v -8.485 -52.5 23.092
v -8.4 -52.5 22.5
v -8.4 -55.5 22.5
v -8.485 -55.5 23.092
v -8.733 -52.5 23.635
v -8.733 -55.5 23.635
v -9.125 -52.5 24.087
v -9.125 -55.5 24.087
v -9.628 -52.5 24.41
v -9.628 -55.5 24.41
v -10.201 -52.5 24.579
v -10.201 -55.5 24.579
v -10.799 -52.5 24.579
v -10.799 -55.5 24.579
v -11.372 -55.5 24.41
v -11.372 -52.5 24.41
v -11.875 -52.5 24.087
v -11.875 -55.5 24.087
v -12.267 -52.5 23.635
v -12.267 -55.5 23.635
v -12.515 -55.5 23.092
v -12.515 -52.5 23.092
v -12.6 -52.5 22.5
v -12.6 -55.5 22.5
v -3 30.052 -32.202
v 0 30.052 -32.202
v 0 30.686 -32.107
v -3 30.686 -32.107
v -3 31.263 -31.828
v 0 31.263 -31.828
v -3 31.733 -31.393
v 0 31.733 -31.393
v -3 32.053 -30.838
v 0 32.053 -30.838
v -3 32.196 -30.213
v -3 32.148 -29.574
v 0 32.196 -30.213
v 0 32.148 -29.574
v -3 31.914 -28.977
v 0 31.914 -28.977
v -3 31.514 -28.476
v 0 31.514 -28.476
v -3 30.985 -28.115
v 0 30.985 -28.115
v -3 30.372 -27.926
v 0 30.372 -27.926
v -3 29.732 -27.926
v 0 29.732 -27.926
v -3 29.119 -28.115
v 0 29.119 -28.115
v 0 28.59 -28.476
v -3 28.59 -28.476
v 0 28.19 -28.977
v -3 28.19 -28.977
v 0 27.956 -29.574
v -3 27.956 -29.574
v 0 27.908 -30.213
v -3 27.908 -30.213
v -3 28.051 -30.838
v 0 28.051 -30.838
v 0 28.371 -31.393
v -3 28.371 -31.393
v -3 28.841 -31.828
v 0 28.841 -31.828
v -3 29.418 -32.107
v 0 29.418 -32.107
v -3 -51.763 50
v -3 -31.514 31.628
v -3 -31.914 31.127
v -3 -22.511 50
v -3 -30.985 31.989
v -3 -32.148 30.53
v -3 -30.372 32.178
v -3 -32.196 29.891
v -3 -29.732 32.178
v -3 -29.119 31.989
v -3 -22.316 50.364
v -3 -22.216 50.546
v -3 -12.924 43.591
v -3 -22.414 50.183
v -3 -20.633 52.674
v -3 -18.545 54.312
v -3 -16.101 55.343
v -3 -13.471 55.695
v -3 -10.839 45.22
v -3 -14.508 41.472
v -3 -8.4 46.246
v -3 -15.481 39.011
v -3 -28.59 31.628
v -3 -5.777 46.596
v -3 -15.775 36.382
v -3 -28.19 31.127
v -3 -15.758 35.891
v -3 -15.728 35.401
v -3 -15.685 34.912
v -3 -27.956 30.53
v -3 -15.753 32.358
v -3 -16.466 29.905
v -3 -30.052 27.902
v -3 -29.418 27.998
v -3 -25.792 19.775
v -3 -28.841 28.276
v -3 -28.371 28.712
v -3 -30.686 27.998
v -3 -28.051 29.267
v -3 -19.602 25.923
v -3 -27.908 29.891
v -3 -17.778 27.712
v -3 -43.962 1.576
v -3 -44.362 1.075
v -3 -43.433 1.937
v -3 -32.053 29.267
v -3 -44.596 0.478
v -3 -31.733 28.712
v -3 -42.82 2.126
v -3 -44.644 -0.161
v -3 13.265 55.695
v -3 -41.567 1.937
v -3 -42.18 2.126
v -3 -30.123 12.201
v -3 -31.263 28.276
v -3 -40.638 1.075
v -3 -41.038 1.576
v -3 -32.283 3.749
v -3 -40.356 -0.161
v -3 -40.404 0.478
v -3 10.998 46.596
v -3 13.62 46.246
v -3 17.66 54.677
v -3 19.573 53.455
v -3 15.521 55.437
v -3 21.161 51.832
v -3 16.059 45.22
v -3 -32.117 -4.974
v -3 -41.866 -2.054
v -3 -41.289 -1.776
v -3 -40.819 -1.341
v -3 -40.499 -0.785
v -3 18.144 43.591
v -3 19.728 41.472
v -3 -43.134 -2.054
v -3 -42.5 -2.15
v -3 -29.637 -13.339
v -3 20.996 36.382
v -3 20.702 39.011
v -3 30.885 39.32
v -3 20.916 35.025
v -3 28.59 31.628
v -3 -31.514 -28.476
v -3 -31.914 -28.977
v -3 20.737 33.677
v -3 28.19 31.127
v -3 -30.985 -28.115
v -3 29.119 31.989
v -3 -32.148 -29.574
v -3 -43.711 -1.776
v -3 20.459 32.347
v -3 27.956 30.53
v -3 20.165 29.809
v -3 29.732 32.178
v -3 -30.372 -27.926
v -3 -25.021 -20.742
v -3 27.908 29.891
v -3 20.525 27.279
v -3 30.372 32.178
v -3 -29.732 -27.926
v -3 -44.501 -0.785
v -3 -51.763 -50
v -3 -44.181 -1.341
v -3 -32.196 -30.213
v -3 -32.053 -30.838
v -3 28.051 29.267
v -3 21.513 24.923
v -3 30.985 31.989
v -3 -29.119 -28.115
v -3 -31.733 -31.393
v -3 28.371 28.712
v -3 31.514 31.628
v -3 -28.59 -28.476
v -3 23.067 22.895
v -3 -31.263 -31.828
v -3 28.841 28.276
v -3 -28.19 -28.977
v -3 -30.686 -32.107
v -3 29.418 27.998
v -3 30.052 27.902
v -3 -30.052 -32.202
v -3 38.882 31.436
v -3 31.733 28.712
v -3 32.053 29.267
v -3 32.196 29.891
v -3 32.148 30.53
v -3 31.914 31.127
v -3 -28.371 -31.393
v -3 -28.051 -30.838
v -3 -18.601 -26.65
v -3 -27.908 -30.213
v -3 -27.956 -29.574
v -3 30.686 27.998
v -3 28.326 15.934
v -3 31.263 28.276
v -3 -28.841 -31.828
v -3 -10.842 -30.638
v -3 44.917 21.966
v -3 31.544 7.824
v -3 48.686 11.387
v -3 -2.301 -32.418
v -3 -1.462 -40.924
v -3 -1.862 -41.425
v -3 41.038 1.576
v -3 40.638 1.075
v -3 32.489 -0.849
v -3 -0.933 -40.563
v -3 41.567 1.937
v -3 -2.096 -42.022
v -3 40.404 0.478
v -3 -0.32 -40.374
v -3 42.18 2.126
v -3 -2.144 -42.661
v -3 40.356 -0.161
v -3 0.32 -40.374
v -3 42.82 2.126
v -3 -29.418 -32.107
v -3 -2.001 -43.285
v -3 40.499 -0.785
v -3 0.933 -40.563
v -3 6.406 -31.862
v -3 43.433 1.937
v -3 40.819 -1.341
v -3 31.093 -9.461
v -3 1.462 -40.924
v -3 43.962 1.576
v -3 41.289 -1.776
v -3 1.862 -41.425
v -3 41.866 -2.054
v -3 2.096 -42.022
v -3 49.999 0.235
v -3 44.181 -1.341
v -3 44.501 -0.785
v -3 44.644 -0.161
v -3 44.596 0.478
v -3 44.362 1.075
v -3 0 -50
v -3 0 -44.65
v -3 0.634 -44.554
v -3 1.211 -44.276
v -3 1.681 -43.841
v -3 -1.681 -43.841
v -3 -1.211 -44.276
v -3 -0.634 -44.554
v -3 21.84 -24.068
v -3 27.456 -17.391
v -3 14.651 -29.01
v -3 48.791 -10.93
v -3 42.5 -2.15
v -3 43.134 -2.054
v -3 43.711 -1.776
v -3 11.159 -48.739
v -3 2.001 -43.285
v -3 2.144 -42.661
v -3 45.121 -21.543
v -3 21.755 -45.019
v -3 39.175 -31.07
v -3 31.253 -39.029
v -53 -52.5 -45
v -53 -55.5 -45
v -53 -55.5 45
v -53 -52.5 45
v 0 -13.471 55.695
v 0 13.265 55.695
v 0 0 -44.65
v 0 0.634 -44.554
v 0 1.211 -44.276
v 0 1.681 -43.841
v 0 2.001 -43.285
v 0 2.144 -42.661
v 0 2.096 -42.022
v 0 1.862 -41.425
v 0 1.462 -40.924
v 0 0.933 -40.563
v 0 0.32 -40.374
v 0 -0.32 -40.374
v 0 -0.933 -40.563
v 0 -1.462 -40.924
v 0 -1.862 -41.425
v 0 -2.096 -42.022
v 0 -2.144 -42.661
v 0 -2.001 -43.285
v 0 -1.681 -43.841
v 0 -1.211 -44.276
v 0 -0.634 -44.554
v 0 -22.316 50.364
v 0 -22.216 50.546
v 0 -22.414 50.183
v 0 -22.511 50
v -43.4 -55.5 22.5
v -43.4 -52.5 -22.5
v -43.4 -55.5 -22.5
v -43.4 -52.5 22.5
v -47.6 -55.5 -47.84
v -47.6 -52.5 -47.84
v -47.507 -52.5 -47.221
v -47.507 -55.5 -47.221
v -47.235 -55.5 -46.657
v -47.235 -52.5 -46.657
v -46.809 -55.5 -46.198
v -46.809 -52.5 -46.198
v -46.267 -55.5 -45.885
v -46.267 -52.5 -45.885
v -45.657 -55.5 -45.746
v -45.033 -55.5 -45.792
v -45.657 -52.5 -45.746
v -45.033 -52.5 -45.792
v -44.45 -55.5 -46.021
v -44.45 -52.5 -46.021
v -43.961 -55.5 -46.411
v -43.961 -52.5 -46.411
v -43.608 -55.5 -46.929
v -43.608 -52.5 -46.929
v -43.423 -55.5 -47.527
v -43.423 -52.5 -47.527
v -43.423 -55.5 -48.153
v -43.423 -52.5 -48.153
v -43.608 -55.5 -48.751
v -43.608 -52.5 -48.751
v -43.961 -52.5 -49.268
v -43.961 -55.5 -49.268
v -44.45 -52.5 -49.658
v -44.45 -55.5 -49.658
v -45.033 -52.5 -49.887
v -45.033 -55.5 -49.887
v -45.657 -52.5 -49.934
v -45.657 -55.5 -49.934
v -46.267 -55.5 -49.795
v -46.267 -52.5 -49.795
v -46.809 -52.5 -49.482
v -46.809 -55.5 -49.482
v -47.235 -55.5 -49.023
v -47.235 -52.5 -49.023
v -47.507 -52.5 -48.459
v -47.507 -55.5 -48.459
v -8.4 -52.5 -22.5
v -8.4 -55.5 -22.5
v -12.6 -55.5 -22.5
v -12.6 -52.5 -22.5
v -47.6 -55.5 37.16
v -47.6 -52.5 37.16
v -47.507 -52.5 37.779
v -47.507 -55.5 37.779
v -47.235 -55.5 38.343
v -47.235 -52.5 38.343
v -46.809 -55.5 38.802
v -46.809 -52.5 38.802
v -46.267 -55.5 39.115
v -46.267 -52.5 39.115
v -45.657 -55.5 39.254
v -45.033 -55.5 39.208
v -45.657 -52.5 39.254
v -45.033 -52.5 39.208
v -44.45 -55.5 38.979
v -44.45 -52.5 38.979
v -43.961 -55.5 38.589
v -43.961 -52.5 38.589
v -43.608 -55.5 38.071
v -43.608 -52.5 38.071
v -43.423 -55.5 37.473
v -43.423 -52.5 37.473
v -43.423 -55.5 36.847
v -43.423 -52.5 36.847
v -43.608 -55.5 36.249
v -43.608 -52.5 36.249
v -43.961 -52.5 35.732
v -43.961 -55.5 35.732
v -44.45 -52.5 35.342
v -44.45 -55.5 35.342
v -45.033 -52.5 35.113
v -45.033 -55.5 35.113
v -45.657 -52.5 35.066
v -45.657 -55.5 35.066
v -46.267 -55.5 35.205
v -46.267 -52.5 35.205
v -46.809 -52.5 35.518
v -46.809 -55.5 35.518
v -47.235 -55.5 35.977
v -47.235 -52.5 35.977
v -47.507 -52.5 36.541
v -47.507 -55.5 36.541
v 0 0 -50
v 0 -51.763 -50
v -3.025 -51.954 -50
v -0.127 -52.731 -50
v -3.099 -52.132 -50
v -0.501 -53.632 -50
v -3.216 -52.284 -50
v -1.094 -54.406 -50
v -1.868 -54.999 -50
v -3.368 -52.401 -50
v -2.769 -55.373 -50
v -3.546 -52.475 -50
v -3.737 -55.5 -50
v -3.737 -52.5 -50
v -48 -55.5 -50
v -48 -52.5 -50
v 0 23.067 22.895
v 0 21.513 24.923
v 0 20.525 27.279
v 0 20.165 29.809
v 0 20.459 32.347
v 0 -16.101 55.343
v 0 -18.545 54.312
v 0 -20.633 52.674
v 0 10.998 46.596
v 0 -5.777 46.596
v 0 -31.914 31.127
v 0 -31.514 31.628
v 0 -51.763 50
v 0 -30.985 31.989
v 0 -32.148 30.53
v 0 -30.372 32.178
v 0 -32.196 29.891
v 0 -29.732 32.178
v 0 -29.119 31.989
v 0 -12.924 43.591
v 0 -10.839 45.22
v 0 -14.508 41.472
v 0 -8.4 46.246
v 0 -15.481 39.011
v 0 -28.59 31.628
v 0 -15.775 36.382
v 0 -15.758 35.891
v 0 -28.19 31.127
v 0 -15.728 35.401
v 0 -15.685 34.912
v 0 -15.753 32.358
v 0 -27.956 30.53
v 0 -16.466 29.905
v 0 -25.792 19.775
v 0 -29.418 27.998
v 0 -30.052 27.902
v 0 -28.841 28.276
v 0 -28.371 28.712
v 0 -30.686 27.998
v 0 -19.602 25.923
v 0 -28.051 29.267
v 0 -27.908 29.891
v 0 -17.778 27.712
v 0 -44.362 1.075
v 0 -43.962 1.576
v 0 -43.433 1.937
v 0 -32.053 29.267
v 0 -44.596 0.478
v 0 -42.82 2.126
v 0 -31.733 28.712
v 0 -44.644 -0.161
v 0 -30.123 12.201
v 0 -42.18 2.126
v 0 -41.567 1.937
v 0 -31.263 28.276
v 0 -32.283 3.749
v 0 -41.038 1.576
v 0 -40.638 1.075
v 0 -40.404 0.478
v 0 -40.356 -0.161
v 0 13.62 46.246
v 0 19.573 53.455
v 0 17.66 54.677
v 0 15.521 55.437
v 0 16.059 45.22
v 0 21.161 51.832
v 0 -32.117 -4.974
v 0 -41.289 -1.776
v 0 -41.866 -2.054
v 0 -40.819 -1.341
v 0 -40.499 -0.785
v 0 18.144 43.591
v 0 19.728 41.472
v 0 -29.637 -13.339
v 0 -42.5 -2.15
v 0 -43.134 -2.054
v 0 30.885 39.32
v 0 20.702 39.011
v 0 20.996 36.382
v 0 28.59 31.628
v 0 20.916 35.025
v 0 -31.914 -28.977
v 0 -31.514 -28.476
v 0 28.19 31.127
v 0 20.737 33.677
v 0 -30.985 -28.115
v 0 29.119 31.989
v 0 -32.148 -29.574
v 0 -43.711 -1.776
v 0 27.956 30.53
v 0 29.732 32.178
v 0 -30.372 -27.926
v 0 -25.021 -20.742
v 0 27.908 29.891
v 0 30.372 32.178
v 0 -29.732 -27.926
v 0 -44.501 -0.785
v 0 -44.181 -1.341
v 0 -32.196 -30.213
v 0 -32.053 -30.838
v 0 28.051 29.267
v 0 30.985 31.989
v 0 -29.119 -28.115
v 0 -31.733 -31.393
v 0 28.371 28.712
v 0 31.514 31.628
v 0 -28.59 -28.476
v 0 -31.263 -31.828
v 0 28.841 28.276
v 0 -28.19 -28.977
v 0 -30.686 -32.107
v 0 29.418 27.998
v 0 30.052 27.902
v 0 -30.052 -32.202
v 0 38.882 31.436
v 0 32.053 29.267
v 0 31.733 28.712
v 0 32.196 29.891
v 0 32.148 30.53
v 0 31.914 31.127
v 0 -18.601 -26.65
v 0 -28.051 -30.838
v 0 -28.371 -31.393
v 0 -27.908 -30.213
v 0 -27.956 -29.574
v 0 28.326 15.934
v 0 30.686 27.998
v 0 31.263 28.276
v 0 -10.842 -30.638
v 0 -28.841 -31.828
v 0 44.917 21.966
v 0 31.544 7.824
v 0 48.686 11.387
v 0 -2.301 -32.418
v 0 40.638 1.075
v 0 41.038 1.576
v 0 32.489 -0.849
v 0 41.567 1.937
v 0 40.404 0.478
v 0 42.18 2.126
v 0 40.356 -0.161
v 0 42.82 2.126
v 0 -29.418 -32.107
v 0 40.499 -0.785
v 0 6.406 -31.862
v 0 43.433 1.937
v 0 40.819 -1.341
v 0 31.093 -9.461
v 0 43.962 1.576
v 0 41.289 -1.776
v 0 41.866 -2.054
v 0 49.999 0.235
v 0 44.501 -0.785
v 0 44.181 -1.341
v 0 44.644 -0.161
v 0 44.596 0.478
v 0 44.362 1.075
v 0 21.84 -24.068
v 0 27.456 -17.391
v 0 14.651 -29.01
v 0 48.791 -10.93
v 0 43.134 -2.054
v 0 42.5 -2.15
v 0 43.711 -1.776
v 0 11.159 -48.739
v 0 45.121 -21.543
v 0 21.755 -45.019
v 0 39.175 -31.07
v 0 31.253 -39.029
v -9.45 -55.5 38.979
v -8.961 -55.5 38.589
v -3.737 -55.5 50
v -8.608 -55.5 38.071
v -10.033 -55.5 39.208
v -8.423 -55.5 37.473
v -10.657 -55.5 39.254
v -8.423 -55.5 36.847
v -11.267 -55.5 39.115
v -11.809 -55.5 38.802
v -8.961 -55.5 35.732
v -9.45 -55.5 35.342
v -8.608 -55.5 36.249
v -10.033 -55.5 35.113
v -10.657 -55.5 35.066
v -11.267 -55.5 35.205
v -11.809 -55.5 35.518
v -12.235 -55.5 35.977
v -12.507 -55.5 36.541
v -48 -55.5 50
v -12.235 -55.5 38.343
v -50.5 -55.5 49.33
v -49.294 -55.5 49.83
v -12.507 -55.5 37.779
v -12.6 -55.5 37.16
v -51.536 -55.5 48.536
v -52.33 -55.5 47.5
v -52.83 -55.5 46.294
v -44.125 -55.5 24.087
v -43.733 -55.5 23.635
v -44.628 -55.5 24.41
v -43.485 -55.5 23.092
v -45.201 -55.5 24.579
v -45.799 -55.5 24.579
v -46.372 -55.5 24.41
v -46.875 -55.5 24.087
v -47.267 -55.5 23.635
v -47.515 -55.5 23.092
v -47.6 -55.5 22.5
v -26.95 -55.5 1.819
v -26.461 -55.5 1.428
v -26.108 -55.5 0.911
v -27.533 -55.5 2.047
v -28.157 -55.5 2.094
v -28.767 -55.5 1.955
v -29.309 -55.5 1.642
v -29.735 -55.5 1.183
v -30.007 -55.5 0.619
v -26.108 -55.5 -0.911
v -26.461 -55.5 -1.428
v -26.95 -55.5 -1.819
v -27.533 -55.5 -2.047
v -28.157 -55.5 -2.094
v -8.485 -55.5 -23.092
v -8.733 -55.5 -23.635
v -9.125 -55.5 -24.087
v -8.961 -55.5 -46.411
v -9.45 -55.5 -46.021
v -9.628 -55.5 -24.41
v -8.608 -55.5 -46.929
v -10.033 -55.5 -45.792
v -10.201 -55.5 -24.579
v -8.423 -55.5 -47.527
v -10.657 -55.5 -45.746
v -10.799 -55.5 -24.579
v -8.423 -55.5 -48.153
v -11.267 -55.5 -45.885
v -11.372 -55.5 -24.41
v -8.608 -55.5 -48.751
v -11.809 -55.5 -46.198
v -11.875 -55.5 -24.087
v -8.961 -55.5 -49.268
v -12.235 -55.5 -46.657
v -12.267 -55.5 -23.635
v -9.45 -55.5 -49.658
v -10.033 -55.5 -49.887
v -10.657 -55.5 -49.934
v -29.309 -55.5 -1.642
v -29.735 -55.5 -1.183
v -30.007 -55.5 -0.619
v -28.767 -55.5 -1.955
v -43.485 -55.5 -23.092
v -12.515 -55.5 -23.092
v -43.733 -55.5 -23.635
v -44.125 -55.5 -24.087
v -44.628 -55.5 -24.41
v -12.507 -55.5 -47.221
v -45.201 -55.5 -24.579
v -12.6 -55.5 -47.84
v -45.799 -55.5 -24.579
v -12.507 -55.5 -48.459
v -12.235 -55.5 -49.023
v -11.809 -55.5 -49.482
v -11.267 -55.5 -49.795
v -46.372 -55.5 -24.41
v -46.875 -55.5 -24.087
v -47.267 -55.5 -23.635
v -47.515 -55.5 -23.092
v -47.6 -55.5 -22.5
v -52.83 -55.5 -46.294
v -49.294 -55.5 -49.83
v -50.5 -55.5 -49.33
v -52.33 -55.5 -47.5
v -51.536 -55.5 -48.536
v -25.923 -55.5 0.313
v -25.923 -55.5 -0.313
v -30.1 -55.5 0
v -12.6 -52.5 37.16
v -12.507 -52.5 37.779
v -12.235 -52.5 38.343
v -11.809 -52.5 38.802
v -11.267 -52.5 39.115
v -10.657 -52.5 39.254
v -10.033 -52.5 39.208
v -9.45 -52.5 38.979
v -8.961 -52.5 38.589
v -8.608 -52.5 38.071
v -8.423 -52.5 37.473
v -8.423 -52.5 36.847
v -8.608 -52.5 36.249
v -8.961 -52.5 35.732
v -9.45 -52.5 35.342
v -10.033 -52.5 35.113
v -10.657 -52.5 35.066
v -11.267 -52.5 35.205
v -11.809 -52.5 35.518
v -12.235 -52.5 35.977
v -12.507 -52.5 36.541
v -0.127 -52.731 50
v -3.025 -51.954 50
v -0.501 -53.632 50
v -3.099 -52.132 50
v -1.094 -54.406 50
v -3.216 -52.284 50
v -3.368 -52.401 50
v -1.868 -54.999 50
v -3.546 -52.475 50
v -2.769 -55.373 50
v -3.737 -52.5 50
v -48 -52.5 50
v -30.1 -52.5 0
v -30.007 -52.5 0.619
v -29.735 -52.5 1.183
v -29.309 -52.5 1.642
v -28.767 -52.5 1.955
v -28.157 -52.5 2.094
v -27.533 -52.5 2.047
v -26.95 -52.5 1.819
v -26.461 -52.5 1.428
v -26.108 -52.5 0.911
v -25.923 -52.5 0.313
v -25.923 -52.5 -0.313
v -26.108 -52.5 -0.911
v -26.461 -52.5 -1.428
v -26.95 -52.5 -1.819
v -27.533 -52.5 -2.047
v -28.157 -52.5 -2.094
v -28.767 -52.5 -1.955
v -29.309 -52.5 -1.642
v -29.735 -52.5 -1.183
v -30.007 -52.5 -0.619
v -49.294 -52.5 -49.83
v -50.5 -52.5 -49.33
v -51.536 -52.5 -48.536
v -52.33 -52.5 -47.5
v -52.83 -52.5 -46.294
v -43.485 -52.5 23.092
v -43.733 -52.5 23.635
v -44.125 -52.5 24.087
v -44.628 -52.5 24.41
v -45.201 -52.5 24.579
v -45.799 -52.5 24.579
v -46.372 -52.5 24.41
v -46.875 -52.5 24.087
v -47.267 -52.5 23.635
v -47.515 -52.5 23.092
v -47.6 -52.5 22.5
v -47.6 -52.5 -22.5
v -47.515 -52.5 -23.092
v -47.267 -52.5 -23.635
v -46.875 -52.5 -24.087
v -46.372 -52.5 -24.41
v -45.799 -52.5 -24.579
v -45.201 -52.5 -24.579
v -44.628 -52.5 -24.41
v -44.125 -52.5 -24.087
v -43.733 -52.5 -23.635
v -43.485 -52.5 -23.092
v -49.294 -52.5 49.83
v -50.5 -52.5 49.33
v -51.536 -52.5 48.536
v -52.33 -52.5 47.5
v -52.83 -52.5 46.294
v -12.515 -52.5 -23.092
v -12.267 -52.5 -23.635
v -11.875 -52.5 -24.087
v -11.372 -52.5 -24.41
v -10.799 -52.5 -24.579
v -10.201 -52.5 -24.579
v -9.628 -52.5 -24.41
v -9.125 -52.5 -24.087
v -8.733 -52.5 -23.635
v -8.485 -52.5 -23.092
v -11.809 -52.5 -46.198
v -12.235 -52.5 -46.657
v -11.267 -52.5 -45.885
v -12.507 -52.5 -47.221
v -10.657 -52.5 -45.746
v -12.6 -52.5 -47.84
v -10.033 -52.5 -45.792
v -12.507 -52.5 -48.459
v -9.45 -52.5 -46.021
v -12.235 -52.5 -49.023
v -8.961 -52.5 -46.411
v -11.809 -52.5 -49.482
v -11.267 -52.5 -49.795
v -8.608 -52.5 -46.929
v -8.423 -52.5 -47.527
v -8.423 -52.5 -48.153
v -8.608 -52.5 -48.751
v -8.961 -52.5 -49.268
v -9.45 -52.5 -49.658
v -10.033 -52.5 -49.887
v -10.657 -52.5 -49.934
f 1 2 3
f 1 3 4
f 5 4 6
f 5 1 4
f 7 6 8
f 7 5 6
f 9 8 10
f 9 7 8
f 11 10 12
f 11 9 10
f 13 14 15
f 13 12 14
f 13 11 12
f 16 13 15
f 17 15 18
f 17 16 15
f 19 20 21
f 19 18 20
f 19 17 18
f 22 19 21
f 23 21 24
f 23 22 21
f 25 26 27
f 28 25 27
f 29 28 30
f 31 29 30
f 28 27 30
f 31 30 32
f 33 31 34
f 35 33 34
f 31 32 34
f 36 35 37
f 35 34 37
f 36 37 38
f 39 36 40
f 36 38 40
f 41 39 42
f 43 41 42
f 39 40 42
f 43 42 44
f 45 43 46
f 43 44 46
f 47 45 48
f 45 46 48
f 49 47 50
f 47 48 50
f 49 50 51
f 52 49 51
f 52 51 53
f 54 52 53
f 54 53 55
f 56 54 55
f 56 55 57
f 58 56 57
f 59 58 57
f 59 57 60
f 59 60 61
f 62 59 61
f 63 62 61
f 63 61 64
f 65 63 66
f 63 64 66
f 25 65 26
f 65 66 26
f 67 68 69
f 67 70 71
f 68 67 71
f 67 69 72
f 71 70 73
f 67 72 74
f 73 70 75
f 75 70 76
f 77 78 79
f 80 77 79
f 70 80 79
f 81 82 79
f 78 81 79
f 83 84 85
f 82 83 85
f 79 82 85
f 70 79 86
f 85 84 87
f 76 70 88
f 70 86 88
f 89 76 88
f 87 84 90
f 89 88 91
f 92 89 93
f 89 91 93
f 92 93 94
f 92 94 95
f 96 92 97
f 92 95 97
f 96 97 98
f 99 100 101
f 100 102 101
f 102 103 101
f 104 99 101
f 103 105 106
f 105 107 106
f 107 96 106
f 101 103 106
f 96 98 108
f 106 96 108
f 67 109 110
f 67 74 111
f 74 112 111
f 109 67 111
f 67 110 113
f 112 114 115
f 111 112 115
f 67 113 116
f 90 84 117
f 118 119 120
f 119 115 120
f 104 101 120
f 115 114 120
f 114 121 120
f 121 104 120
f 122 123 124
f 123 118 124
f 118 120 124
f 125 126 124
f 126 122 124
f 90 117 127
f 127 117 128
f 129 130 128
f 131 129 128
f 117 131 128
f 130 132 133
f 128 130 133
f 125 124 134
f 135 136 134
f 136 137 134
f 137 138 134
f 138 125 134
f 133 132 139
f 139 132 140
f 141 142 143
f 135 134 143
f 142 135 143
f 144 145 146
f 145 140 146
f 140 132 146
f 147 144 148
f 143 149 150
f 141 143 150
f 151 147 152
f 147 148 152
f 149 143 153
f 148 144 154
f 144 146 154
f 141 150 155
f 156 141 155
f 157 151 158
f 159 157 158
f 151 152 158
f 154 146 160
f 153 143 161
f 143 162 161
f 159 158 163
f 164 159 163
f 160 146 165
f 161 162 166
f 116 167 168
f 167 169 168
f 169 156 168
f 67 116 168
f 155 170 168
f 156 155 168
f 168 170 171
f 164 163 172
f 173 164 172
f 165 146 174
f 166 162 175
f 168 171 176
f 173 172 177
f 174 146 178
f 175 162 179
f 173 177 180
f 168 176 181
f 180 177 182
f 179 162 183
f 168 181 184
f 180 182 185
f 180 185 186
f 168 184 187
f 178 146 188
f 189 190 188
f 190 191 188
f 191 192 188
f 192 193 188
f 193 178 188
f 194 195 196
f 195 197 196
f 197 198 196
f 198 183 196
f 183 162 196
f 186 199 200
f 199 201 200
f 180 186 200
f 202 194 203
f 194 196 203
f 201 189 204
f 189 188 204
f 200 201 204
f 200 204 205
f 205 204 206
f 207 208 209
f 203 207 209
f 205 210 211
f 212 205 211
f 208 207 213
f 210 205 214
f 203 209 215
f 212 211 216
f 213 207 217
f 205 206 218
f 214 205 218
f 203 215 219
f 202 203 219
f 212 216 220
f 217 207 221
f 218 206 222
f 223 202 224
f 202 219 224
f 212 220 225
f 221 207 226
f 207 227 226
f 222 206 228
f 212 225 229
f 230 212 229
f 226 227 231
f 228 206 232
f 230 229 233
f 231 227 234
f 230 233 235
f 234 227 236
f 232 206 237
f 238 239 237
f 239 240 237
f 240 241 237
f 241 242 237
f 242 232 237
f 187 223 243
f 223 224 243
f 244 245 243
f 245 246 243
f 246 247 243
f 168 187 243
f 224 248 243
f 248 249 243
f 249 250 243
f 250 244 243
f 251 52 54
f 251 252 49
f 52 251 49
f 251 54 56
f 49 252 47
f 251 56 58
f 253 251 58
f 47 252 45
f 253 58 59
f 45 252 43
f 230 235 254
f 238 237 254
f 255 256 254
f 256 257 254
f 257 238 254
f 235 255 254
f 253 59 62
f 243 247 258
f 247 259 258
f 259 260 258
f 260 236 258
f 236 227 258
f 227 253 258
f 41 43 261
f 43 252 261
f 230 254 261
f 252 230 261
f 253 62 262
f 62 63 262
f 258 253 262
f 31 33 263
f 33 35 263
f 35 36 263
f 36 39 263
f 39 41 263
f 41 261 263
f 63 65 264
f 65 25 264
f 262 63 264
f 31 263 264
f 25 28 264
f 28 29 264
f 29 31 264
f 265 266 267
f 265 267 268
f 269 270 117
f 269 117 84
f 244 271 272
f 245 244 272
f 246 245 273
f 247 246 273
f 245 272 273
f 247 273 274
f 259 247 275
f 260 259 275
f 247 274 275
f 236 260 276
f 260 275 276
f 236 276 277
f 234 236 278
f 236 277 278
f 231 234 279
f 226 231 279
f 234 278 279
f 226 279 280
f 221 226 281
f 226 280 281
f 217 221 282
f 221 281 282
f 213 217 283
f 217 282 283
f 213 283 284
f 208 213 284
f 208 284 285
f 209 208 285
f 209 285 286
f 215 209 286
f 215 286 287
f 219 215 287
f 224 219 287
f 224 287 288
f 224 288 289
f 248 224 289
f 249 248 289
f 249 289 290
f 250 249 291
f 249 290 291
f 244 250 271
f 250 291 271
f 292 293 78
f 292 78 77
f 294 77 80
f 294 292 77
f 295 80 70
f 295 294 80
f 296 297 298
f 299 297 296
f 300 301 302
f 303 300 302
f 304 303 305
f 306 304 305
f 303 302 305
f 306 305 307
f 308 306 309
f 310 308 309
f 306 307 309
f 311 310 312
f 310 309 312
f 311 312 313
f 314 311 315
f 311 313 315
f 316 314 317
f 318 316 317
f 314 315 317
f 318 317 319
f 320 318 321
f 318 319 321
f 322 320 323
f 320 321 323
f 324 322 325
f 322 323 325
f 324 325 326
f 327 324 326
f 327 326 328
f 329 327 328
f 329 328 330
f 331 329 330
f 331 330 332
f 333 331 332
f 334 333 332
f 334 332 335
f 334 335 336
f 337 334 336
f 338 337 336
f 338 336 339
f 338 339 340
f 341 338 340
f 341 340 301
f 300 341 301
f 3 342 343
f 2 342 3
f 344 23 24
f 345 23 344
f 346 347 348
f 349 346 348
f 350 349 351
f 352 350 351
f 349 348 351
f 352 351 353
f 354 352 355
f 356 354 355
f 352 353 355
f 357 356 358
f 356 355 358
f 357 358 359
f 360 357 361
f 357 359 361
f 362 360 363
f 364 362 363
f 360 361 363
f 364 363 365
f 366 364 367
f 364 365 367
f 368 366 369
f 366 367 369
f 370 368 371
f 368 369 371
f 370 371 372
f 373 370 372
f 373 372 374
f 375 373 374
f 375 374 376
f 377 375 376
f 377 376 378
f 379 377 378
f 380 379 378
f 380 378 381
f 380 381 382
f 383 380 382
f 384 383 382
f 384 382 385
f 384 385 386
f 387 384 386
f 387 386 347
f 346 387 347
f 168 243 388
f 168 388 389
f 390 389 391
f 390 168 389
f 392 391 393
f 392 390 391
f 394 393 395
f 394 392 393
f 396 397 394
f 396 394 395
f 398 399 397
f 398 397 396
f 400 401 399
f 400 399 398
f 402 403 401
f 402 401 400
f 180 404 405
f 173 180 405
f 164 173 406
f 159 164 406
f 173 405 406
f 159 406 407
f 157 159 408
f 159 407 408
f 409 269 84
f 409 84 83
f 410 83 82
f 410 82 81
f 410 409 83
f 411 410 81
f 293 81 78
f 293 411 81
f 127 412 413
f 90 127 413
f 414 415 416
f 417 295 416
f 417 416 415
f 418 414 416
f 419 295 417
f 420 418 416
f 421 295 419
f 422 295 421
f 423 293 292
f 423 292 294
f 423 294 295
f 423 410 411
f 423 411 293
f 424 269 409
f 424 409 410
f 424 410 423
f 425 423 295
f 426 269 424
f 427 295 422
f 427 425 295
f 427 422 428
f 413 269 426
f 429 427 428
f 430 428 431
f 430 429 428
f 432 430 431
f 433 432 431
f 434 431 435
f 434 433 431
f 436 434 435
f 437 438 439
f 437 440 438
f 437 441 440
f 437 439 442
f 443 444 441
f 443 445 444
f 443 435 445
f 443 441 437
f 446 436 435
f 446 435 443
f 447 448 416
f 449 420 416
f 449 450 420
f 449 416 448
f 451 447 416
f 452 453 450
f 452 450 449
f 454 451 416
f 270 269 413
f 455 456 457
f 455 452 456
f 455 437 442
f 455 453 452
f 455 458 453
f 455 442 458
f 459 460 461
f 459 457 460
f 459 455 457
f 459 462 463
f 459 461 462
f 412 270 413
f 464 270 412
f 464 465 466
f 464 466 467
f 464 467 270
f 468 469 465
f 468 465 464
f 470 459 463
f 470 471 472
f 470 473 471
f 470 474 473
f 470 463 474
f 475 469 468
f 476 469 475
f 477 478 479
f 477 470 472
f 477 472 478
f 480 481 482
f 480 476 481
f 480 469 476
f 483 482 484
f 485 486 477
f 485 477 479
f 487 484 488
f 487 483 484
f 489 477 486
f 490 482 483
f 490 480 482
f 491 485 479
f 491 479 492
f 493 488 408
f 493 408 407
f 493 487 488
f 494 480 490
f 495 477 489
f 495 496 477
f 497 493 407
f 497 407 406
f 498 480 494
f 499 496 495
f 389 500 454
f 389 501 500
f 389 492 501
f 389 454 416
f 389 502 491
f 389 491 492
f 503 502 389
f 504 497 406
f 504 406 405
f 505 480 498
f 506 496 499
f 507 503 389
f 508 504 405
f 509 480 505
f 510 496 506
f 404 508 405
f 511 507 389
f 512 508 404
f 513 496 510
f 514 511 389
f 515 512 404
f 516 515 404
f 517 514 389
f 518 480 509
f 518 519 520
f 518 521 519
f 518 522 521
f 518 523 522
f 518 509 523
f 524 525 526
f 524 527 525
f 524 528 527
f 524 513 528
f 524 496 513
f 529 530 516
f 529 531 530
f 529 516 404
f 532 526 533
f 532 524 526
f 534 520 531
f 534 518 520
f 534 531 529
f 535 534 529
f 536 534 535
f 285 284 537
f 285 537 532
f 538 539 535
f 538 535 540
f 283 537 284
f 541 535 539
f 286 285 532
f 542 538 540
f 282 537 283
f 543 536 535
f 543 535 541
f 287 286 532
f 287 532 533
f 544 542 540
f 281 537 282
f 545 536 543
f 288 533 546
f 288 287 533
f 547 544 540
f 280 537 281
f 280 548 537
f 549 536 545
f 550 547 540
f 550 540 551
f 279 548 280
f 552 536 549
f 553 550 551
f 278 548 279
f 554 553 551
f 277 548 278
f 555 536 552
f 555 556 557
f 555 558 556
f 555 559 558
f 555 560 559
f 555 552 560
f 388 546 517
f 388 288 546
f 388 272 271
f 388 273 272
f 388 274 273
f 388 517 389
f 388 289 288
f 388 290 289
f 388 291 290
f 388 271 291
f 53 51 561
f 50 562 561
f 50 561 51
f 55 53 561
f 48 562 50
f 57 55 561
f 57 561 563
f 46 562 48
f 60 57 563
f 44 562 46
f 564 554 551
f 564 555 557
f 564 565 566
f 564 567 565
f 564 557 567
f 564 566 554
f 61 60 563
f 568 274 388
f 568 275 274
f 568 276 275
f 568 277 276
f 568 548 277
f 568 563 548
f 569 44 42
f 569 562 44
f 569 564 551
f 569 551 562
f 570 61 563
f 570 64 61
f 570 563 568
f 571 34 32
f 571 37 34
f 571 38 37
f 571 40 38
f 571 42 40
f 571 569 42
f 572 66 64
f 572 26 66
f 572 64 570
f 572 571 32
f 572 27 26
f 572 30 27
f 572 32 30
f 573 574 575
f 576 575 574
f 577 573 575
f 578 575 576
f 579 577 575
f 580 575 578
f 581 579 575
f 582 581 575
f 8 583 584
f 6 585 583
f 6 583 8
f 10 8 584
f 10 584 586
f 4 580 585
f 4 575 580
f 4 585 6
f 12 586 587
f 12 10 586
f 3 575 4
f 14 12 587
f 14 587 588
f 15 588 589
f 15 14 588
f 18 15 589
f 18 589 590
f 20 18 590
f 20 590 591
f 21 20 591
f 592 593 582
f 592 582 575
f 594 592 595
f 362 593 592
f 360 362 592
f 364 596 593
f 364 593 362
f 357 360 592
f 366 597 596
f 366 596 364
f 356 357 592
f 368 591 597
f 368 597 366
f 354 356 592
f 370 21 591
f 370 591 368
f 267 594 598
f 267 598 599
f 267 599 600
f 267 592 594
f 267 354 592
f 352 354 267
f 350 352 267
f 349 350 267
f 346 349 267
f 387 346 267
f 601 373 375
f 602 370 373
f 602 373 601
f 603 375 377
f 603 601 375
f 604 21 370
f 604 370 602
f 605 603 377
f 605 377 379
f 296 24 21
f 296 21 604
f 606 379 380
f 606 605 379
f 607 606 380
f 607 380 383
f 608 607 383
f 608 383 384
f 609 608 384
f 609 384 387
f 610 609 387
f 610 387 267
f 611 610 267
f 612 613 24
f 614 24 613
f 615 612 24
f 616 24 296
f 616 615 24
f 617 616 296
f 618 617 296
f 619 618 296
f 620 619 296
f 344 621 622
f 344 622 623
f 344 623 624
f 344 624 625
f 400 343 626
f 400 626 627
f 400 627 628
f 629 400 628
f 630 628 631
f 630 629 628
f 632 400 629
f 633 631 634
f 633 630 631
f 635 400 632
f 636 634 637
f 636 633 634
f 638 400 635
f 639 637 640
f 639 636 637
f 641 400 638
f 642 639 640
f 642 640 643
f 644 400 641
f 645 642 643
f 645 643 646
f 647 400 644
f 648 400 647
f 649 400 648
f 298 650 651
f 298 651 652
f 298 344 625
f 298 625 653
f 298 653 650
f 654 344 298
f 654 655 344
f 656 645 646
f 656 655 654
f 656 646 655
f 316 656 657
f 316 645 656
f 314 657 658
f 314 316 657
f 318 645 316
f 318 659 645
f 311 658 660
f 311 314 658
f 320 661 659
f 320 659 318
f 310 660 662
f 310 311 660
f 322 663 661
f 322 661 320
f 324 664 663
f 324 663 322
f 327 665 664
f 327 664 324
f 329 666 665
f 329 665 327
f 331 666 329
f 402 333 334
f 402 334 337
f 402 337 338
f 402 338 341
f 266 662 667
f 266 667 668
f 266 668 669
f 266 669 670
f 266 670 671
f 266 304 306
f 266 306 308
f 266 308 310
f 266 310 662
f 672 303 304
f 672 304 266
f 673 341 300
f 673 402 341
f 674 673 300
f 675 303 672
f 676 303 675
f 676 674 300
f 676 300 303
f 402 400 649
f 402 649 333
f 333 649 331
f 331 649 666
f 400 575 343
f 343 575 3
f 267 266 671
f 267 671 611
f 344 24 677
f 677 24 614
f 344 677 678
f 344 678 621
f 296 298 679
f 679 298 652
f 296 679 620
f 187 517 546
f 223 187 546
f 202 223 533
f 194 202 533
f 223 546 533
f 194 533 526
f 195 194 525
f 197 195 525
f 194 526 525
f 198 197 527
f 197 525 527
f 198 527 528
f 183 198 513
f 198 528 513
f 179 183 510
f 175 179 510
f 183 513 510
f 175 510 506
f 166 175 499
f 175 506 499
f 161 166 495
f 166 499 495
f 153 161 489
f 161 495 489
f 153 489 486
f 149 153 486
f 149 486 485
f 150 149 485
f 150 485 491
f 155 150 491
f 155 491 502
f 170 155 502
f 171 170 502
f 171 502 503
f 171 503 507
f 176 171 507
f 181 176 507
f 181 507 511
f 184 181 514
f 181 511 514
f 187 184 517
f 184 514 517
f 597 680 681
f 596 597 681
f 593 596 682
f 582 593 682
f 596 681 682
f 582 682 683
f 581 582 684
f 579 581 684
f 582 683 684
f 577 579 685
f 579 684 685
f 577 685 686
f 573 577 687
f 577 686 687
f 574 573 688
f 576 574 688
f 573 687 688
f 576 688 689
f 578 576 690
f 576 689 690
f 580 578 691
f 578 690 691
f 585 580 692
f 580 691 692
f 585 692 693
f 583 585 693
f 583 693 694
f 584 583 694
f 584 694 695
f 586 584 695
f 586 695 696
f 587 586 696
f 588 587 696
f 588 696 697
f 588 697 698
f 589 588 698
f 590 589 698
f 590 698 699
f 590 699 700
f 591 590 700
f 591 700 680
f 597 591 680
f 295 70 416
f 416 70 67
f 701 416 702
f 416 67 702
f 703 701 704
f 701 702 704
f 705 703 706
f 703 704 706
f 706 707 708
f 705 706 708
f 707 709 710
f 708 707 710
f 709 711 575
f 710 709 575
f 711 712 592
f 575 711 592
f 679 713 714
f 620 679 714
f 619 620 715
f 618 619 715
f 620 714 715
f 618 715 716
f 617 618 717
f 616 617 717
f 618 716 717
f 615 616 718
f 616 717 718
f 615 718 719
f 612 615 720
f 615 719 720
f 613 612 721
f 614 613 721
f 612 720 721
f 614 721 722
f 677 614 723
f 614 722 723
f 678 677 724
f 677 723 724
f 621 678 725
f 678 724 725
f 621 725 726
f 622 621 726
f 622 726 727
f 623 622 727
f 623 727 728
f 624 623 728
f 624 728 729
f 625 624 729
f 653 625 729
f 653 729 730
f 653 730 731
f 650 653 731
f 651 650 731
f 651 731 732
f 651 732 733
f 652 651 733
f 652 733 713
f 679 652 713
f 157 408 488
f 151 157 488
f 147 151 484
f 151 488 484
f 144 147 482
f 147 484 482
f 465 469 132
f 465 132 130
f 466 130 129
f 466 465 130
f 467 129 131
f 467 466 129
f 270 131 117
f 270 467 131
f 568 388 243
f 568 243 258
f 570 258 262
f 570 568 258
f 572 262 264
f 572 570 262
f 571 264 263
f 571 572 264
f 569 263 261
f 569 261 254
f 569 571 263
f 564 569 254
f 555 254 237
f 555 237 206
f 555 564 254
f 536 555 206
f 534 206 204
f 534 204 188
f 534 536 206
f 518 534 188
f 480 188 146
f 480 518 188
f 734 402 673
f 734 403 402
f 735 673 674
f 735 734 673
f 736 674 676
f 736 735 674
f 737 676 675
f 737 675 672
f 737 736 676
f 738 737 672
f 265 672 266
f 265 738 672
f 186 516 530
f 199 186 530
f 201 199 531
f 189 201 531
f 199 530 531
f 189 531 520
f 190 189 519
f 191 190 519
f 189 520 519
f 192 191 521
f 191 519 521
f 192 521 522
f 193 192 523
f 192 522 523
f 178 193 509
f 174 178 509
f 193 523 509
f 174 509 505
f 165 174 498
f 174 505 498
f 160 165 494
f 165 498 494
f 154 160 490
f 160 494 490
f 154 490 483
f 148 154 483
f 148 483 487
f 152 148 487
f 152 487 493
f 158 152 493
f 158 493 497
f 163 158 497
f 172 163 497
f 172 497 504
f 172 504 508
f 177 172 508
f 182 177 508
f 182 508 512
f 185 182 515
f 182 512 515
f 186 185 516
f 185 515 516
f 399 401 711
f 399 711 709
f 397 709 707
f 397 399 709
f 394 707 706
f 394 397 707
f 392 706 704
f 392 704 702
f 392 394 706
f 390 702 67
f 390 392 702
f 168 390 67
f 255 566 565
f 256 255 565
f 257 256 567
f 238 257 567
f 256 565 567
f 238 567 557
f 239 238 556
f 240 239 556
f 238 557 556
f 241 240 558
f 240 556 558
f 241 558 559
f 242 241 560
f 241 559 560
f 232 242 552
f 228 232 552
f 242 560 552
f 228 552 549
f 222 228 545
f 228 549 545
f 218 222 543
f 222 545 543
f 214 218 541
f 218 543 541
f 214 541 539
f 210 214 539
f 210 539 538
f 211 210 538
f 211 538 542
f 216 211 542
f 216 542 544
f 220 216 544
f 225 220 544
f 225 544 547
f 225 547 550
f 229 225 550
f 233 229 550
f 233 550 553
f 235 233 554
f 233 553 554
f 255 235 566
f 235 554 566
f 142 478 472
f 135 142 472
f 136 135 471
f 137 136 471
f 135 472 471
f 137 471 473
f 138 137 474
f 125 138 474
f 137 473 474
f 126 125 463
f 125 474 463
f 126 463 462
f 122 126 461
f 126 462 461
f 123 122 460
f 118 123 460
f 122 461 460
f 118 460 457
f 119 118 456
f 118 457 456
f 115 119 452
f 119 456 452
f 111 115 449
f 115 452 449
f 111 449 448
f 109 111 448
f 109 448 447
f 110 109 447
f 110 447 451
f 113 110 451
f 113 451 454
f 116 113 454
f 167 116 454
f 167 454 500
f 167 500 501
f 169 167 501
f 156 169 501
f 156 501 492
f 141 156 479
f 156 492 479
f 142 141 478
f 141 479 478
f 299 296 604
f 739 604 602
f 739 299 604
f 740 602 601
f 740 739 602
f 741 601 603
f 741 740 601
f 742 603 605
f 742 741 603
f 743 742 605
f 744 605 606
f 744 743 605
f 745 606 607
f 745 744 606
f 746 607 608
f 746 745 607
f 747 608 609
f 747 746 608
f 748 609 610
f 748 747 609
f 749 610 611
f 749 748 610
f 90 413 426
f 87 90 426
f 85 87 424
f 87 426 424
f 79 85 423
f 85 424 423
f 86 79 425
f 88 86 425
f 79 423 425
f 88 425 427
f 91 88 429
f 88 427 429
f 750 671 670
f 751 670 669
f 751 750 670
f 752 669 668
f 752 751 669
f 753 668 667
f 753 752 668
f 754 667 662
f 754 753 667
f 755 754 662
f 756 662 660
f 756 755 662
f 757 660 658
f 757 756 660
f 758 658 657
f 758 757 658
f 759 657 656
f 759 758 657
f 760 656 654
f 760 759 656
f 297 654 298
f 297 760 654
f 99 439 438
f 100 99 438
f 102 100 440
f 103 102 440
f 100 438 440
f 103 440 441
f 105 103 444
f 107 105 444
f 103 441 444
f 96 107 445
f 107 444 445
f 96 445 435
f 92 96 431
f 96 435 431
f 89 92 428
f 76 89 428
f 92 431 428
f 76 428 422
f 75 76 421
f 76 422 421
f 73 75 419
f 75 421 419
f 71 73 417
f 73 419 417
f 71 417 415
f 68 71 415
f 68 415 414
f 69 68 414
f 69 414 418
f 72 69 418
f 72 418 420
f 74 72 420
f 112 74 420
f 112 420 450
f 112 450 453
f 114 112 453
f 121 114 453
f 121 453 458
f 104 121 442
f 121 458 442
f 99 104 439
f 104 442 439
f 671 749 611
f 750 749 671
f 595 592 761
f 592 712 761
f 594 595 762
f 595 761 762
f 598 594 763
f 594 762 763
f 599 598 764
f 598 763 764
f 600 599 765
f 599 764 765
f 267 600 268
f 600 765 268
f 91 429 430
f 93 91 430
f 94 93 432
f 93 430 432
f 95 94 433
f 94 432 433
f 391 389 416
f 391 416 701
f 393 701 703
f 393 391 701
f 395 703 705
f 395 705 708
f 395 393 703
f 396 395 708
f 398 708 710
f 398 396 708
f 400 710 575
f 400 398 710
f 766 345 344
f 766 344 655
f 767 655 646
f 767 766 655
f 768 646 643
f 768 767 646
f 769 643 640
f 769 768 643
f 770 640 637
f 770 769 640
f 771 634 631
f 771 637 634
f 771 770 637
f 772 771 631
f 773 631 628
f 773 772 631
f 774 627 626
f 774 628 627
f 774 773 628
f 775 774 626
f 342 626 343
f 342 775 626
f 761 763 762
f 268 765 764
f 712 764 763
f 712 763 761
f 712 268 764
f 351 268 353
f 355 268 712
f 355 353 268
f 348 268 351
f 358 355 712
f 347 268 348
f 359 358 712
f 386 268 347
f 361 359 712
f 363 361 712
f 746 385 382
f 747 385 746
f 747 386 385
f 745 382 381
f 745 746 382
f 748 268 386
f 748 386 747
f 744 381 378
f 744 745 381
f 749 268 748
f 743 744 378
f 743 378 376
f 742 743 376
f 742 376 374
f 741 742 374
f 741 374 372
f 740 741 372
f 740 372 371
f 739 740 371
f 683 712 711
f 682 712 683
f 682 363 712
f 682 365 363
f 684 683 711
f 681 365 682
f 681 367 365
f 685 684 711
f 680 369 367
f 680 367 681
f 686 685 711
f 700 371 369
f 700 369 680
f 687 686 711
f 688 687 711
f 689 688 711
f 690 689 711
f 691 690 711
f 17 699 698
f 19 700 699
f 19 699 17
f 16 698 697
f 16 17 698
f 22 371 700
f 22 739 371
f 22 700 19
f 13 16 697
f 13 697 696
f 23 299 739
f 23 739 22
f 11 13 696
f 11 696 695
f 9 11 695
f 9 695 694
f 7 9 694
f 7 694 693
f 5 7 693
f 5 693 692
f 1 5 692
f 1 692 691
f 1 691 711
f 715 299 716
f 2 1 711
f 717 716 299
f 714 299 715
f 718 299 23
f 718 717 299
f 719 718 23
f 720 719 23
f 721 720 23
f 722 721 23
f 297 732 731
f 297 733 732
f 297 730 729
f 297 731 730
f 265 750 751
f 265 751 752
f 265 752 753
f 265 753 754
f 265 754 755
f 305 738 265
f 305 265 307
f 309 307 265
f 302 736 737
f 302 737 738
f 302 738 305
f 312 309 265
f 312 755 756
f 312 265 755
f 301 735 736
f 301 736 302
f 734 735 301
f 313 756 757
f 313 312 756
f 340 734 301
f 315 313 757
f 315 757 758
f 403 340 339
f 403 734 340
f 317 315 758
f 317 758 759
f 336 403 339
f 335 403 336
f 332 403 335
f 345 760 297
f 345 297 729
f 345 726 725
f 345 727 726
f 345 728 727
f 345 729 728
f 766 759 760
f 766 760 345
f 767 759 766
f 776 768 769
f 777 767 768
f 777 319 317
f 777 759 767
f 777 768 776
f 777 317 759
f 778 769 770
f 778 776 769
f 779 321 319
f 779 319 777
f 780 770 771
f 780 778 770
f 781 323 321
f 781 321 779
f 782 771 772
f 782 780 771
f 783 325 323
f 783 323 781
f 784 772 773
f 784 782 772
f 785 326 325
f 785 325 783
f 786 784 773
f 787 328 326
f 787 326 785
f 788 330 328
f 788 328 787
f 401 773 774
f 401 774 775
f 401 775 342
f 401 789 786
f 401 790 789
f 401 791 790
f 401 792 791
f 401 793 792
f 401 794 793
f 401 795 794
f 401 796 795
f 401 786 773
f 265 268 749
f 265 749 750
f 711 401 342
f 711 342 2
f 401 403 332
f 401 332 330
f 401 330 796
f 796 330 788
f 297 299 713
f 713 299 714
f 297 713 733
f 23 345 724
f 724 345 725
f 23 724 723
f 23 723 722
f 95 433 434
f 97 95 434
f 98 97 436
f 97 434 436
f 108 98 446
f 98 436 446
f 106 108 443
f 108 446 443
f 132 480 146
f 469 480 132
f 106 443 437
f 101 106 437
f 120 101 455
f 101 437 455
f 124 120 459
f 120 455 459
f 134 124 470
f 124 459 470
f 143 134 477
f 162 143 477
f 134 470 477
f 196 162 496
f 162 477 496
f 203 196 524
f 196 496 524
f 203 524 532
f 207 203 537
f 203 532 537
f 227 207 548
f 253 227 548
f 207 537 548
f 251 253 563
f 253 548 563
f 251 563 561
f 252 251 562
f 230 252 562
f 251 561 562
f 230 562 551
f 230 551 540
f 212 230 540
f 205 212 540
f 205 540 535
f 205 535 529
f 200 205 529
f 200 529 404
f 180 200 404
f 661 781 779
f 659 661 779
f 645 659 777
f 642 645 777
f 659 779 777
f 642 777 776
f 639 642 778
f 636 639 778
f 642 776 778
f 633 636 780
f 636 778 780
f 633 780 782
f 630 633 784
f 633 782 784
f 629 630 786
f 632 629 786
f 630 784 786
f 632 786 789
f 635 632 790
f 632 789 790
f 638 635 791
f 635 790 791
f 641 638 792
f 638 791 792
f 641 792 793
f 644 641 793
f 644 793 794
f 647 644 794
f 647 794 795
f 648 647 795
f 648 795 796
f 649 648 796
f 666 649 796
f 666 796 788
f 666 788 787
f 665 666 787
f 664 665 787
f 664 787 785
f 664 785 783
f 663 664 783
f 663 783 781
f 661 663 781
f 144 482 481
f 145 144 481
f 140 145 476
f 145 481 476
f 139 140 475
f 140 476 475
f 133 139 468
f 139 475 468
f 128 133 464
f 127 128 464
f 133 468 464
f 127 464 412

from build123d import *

# Parameters (mm, degrees)
SKETCH_1_R                       = 2.15
SM_BASE_FLANGE_1_DEPTH           = 3
SM_EDGE_FLANGE_1_STRIP_W         = 13.4732
SM_EDGE_FLANGE_1_STRIP_H         = 3
SM_EDGE_FLANGE_1_STRIP_CUT_DEPTH = 100
SM_EDGE_FLANGE_1_DEPTH           = 100
SKETCH_9_R                       = 2.1
CUT_EXTRUDE_1_DEPTH              = 10
FILLET_1_R                       = 5
SKETCH_10_R                      = 2.1
CUT_EXTRUDE_2_DEPTH              = 10


# Sheet-metal steps are written as plain solids
with BuildPart() as part:
    # Sketch 1 → 基体-法兰1 (new body)
    with BuildSketch(Plane(origin=(0, 0, 0), x_dir=(0, 0, -1), z_dir=(1, 0, 0))):
        with BuildLine():
            Line((-50, -22.510788707), (-50, -55.5))
            Line((-50, -55.5), (50, -55.5))
            Line((50, -55.5), (50, 0))
            ThreePointArc((50, 0), (16.339860062, 47.254724348), (-39.320358927, 30.885423324))
            Line((-39.320358927, 30.885423324), (-51.83191014, 21.160585638))
            ThreePointArc((-51.83191014, 21.160585638), (-54.677464079, 17.660055501), (-55.695008503, 13.265116159))
            Line((-55.695008503, 13.265116159), (-55.695008503, -13.471087591))
            ThreePointArc((-55.695008503, -13.471087591), (-54.312022765, -18.545244191), (-50.545595463, -22.215903549))
            ThreePointArc((-50.545595463, -22.215903549), (-50.273602999, -22.364836031), (-50, -22.510788707))
        make_face()
        with Locations((0, 42.5)):
            Circle(SKETCH_1_R, mode=Mode.SUBTRACT)
        with Locations((30.0520382, 30.0520382)):
            Circle(SKETCH_1_R, mode=Mode.SUBTRACT)
        with Locations((42.5, 0)):
            Circle(SKETCH_1_R, mode=Mode.SUBTRACT)
        with Locations((30.0520382, -30.0520382)):
            Circle(SKETCH_1_R, mode=Mode.SUBTRACT)
        with Locations((0, -42.5)):
            Circle(SKETCH_1_R, mode=Mode.SUBTRACT)
        with Locations((-30.0520382, -30.0520382)):
            Circle(SKETCH_1_R, mode=Mode.SUBTRACT)
        with Locations((-30.0520382, 30.0520382)):
            Circle(SKETCH_1_R, mode=Mode.SUBTRACT)
        with BuildLine():
            Line((-46.595603285, 10.997841176), (-46.595603285, -5.777394466))
            ThreePointArc((-46.595603285, -5.777394466), (-43.590659136, -12.923665777), (-36.381764555, -15.775107854))
            ThreePointArc((-36.381764555, -15.775107854), (-35.646197226, -15.744635296), (-34.912439019, -15.684745692))
            ThreePointArc((-34.912439019, -15.684745692), (-29.904748182, -16.465924493), (-25.923223086, -19.601951556))
            ThreePointArc((-25.923223086, -19.601951556), (32.418442092, -2.301002457), (-22.894661052, 23.066956784))
            ThreePointArc((-22.894661052, 23.066956784), (-27.279217704, 20.524739091), (-32.347042381, 20.45870218))
            ThreePointArc((-32.347042381, 20.45870218), (-34.349504558, 20.839101356), (-36.381764555, 20.995554565))
            ThreePointArc((-36.381764555, 20.995554565), (-43.590659136, 18.144112487), (-46.595603285, 10.997841176))
        make_face(mode=Mode.SUBTRACT)
    extrude(amount=-SM_BASE_FLANGE_1_DEPTH)

    # 边线-法兰1 strip (across the edge) → 边线-法兰1 strip cut (cut)
    with BuildSketch(Plane(origin=(-3, -55.5, -50), x_dir=(0, 1, 0), z_dir=(0, 0, 1))):
        with Locations((-3, -1.5)):
            Rectangle(SM_EDGE_FLANGE_1_STRIP_W, SM_EDGE_FLANGE_1_STRIP_H)
    extrude(amount=SM_EDGE_FLANGE_1_STRIP_CUT_DEPTH, mode=Mode.SUBTRACT)

    # 边线-法兰1 section (across the edge) → 边线-法兰1 (add)
    with BuildSketch(Plane(origin=(-3, -55.5, -50), x_dir=(0, 1, 0), z_dir=(0, 0, 1))):
        with BuildLine():
            Line((0, 0.7366), (0, 50))
            Line((0, 50), (3, 50))
            Line((3, 50), (3, 0.7366))
            ThreePointArc((3, 0.7366), (3.215745145, 0.215745145), (3.7366, 0))
            Line((3.7366, 0), (3.7366, -3))
            ThreePointArc((3.7366, -3), (1.094424801, -1.905575199), (0, 0.7366))
        make_face()
    extrude(amount=SM_EDGE_FLANGE_1_DEPTH)

    # 草图9 → 切除-拉伸1 (cut)
    with BuildSketch(Plane(origin=(0, -52.5, 0), x_dir=(1, 0, 0), z_dir=(0, 1, 0))):
        with Locations(Location((-45.5, 47.839820537, 0), (0, 0, 180))):
            Circle(SKETCH_9_R)
        with Locations(Location((-10.5, 47.839820537, 0), (0, 0, 180))):
            Circle(SKETCH_9_R)
        with Locations(Location((-45.5, -37.160179463, 0), (0, 0, 180))):
            Circle(SKETCH_9_R)
        with Locations(Location((-10.5, -37.160179463, 0), (0, 0, 180))):
            Circle(SKETCH_9_R)
    extrude(amount=-CUT_EXTRUDE_1_DEPTH, mode=Mode.SUBTRACT)

    # 圆角1
    fillet_1_edges = [part.edges().sort_by_distance(p)[0] for p in [
        (-53, -54, -50),
        (-53, -54, 50),
    ]]
    fillet(fillet_1_edges, radius=FILLET_1_R)

    # 草图10 → 切除-拉伸2 (cut)
    with BuildSketch(Plane(origin=(0, -52.5, 0), x_dir=(1, 0, 0), z_dir=(0, 1, 0))):
        with Locations(Location((-28, 0, 0), (0, 0, 180))):
            Circle(SKETCH_10_R)
        with BuildLine():
            Line((-43.4, 22.5), (-43.4, -22.5))
            ThreePointArc((-43.4, -22.5), (-45.5, -24.6), (-47.6, -22.5))
            Line((-47.6, -22.5), (-47.6, 22.5))
            ThreePointArc((-47.6, 22.5), (-45.5, 24.6), (-43.4, 22.5))
        make_face()
        with BuildLine():
            Line((-8.4, 22.5), (-8.4, -22.5))
            ThreePointArc((-8.4, -22.5), (-10.5, -24.6), (-12.6, -22.5))
            Line((-12.6, -22.5), (-12.6, 22.5))
            ThreePointArc((-12.6, 22.5), (-10.5, 24.6), (-8.4, 22.5))
        make_face()
    extrude(amount=-CUT_EXTRUDE_2_DEPTH, mode=Mode.SUBTRACT)


solid = part.part
